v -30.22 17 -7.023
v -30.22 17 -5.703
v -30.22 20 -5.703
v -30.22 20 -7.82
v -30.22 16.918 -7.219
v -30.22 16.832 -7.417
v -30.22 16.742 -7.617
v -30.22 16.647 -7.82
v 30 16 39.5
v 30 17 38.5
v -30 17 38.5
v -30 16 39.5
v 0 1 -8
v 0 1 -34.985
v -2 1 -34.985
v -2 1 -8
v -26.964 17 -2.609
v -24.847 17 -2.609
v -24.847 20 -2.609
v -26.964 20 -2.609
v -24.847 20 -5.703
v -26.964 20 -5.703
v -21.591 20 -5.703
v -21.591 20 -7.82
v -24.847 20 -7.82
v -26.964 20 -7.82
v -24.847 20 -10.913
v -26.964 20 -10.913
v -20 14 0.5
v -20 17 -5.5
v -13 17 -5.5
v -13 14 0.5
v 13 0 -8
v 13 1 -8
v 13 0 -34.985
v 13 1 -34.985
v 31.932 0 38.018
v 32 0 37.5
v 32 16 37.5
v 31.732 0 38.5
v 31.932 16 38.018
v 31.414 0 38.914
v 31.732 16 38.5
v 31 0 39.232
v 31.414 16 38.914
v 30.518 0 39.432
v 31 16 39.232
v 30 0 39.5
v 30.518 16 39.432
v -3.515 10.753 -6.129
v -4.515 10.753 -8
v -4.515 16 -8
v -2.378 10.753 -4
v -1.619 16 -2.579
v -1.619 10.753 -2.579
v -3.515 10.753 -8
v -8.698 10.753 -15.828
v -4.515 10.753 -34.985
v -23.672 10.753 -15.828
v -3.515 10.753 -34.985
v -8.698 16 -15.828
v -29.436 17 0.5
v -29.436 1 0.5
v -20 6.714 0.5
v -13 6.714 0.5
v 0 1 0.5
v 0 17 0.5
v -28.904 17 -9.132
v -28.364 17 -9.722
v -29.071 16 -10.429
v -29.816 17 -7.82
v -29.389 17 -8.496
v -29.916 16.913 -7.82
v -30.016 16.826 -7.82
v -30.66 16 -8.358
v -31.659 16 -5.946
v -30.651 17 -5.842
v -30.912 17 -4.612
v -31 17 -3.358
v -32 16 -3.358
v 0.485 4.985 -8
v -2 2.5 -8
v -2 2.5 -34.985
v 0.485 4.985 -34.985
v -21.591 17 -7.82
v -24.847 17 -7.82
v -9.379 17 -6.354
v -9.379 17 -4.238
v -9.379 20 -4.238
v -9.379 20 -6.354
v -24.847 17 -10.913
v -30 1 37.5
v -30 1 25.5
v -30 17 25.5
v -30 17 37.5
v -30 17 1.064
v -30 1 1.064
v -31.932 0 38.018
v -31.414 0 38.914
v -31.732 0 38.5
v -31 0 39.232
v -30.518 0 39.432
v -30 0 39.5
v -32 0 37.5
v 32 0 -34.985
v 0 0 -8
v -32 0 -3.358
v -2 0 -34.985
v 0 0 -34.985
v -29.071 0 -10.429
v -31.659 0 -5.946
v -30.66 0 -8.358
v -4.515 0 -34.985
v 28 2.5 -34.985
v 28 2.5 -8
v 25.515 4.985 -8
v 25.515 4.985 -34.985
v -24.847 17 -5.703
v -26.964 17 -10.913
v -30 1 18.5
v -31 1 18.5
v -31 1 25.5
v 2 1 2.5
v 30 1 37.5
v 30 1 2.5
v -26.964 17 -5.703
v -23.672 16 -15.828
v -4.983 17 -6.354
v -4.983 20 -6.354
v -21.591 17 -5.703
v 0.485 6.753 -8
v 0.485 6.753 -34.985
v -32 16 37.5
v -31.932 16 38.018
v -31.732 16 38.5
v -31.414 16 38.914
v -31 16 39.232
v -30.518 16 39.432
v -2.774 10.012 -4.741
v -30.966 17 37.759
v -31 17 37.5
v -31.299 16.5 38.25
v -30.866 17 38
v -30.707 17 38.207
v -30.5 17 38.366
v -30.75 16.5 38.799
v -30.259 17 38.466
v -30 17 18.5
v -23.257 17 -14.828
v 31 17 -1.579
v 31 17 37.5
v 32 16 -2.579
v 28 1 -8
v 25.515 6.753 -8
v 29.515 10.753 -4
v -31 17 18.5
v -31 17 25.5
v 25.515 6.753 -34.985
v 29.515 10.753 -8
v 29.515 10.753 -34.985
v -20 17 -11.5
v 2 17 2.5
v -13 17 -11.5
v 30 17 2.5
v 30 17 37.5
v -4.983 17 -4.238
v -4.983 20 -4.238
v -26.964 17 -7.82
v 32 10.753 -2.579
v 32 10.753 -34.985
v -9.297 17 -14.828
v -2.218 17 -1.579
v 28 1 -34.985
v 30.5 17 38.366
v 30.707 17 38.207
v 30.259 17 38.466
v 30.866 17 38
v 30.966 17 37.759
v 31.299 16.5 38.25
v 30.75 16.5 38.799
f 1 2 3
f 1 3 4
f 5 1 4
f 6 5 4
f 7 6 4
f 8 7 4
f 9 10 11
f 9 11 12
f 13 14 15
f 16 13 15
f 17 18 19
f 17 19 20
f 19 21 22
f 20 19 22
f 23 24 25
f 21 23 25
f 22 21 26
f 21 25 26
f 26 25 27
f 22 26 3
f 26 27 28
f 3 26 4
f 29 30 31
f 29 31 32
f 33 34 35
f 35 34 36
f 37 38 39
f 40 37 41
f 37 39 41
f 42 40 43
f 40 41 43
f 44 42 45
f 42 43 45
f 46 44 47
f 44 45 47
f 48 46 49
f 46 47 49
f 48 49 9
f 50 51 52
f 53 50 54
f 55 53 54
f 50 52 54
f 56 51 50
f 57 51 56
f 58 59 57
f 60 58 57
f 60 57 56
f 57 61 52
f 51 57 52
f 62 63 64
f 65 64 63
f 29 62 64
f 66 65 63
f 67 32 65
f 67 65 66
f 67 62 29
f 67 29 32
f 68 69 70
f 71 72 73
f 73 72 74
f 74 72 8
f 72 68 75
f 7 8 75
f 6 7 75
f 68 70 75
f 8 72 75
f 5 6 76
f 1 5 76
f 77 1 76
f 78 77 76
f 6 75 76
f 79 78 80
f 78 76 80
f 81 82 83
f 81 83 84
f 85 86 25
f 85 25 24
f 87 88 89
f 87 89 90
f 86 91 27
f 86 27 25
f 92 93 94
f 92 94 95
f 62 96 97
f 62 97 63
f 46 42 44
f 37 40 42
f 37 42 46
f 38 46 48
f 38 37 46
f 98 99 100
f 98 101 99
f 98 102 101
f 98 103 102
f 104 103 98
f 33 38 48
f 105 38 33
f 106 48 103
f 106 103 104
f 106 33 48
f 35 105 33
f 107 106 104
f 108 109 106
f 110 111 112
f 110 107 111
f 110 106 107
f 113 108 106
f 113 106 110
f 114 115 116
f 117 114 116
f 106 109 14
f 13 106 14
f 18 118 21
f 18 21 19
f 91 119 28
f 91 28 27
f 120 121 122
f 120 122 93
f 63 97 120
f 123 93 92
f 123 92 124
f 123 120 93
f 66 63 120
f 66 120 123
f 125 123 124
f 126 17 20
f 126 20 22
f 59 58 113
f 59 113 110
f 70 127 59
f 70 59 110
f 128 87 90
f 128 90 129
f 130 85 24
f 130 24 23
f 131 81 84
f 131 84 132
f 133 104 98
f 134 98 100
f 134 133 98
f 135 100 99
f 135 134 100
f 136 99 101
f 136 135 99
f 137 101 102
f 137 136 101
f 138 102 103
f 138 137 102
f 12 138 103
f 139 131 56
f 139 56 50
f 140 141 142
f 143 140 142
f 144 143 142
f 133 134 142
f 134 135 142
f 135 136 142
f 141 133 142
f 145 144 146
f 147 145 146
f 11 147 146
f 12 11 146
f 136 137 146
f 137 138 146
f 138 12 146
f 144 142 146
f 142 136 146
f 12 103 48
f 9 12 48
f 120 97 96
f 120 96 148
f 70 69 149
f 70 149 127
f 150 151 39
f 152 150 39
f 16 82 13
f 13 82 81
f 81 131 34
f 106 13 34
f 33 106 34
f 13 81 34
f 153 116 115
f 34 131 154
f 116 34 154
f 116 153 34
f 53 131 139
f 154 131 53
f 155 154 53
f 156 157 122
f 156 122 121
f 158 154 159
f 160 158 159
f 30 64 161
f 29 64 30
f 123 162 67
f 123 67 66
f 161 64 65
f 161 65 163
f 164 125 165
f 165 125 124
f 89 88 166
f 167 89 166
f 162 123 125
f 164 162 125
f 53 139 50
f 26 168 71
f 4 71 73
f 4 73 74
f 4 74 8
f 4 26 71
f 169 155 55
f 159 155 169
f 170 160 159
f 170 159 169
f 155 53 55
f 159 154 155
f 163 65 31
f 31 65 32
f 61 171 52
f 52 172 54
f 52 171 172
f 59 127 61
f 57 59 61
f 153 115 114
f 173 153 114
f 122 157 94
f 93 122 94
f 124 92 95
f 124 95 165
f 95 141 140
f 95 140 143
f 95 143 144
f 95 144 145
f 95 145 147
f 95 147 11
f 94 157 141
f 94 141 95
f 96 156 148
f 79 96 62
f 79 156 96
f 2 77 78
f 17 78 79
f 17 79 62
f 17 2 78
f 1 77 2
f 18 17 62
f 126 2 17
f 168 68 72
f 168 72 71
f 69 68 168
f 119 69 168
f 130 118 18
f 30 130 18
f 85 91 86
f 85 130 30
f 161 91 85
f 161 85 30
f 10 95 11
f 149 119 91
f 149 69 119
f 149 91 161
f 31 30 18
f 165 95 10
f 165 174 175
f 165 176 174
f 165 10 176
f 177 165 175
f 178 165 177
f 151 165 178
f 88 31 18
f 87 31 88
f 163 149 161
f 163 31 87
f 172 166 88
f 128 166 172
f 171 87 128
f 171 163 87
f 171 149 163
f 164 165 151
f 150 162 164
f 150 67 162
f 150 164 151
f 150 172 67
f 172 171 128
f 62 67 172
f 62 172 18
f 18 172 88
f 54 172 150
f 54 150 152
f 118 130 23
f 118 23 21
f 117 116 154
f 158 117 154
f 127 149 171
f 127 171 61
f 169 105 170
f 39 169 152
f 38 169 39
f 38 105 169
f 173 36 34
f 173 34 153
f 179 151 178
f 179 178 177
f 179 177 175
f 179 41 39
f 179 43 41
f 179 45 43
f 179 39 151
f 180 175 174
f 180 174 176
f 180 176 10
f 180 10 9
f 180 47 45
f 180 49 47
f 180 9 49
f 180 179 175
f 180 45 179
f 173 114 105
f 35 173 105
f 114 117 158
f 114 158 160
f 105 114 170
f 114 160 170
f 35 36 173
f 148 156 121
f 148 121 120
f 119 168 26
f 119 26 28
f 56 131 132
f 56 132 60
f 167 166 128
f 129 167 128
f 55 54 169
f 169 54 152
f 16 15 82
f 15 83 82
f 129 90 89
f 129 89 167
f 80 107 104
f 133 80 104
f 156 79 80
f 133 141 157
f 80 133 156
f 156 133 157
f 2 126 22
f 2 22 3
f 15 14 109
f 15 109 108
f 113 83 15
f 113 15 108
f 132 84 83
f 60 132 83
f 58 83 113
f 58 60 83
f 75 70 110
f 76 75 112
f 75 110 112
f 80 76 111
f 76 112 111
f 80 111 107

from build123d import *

# Parameters (mm, degrees)
SKETCH1_W           = 60
SKETCH1_H           = 75
BOSS_EXTRUDE1_DEPTH = 1
SKETCH2_W           = 64
SKETCH2_H           = 79
SKETCH2_W_2         = 60
SKETCH2_H_2         = 75
BOSS_EXTRUDE2_DEPTH = 17
SKETCH3_W           = 60
SKETCH3_H           = 40
BOSS_EXTRUDE3_DEPTH = 16
SKETCH4_W           = 1
SKETCH4_H           = 7
CUT_EXTRUDE1_DEPTH  = 16
CUT_LOFT2_START     = -20
CUT_LOFT2_DEPTH     = 7
SKETCH7_W           = 21.435869032
SKETCH7_H           = 2
CUT_EXTRUDE2_DEPTH  = 16
CHAMFER1_SIZE       = 10
CHAMFER2_SIZE       = 2
SKETCH9_W           = 30
SKETCH9_H           = 27.5
CUT_EXTRUDE3_DEPTH  = 14
SKETCH10_W          = 2
SKETCH10_H          = 2
BOSS_EXTRUDE5_DEPTH = 7
CUT_EXTRUDE4_DEPTH  = 54.602705156
FILLET1_R           = 10
FILLET2_R           = 10
FILLET3_R           = 2
SKETCH13_W          = 4.396153847
SKETCH13_H          = 2.116666667
BOSS_EXTRUDE7_DEPTH = 3
SKETCH14_W          = 15
SKETCH14_H          = 21.25
CUT_EXTRUDE5_DEPTH  = 52.809748118
CUT_EXTRUDE6_DEPTH  = 9
SKETCH16_W          = 15
SKETCH16_H          = 17.83101705
CUT_EXTRUDE7_DEPTH  = 54.602705156
BOSS_EXTRUDE8_REACH = 62.665
SKETCH18_W          = 40.424998059
SKETCH18_H          = 8.849345581
CUT_EXTRUDE8_DEPTH  = 54.602705156
CUT_EXTRUDE9_DEPTH  = 6.246782155
CHAMFER3_SIZE       = 1
CHAMFER4_SIZE       = 4
SKETCH20_W          = 2
SKETCH20_H          = 1
BOSS_EXTRUDE9_DEPTH = 26.984954309


# Read off the part's stored shape, not the designer's step: Cut-Loft2
# Some blends are built 0.0001 mm under size
with BuildPart() as part:
    # Sketch1 → Boss-Extrude1 (new body)
    with BuildSketch(Plane(origin=(0, 0, 0), x_dir=(1, 0, 0), z_dir=(0, 1, 0))):
        Rectangle(SKETCH1_W, SKETCH1_H)
    extrude(amount=BOSS_EXTRUDE1_DEPTH)

    # Sketch2 → Boss-Extrude2 (add)
    with BuildSketch(Plane.XZ):
        Rectangle(SKETCH2_W, SKETCH2_H)
        Rectangle(SKETCH2_W_2, SKETCH2_H_2, mode=Mode.SUBTRACT)
    extrude(amount=-BOSS_EXTRUDE2_DEPTH)

    # Sketch3 → Boss-Extrude3 (add)
    with BuildSketch(Plane(origin=(0, 1, 0), x_dir=(1, 0, 0), z_dir=(0, 1, 0))):
        with Locations((0, 17.5)):
            Rectangle(SKETCH3_W, SKETCH3_H)
    extrude(amount=BOSS_EXTRUDE3_DEPTH)

    # Sketch4 → Cut-Extrude1 (cut)
    with BuildSketch(Plane(origin=(0, 17, 0), x_dir=(1, 0, 0), z_dir=(0, 1, 0))):
        with Locations((-30.5, -22)):
            Rectangle(SKETCH4_W, SKETCH4_H)
    extrude(amount=-CUT_EXTRUDE1_DEPTH, mode=Mode.SUBTRACT)

    # Cut-Loft2 outline → Cut-Loft2 (cut)
    with BuildSketch(Plane.YZ.offset(CUT_LOFT2_START)):
        Polygon((17, -5.5), (13, 2.5), (5, 2.5), (17, -11.5), align=None)
    extrude(amount=CUT_LOFT2_DEPTH, mode=Mode.SUBTRACT)

    # Sketch7 → Cut-Extrude2 (cut)
    with BuildSketch(Plane(origin=(0, 17, 0), x_dir=(1, 0, 0), z_dir=(0, 1, 0))):
        with Locations((-10.717934516, -1.5)):
            Rectangle(SKETCH7_W, SKETCH7_H)
    extrude(amount=-CUT_EXTRUDE2_DEPTH, mode=Mode.SUBTRACT)

    # Chamfer1
    # the kernel refuses this chamfer: 10 mm, written as the material it takes off along each edge
    with BuildSketch(Plane(origin=(-21.435869032, 42.71682988, 2.5), x_dir=(-0.9996219169112968, 0, 0.02749587661058636), z_dir=(0, -1, 0))) as chamfer1_piece_1_section:
        Polygon((CHAMFER1_SIZE * 0.999621916911, CHAMFER1_SIZE * 0.0274958766106), (-CHAMFER1_SIZE * 0.0274958766106, CHAMFER1_SIZE * 0.999621916911), (0, 0), align=None)
    chamfer1_piece_1 = extrude(amount=41.71682988, mode=Mode.PRIVATE)
    chamfer1_piece_1 = split(chamfer1_piece_1, bisect_by=Plane(origin=(-30, 9, 1.507613822), z_dir=(1, 0, 0)), keep=Keep.TOP, mode=Mode.PRIVATE)
    chamfer1_piece_1 = split(chamfer1_piece_1, bisect_by=Plane(origin=(-25.679544331, 9, 0.5), z_dir=(0, 0, 1)), keep=Keep.TOP, mode=Mode.PRIVATE)
    add(chamfer1_piece_1, mode=Mode.SUBTRACT)

    # Chamfer2
    chamfer2_edges = [part.edges().sort_by_distance(p)[0] for p in [
        (0, 9, 2.5),
    ]]
    chamfer(chamfer2_edges, length=CHAMFER2_SIZE - 0.0001)  # a hair under: the kernel refuses the full size

    # Sketch9 → Cut-Extrude3 (cut)
    with BuildSketch(Plane(origin=(0, 17, 0), x_dir=(1, 0, 0), z_dir=(0, 1, 0))):
        with Locations((13, 21.75)):
            Rectangle(SKETCH9_W, SKETCH9_H)
    extrude(amount=-CUT_EXTRUDE3_DEPTH, mode=Mode.SUBTRACT)

    # Sketch10 → Boss-Extrude5 (add)
    with BuildSketch(Plane(origin=(0, 3, 0), x_dir=(1, 0, 0), z_dir=(0, 1, 0))):
        Polygon((-2, 23), (10, 23), (10, 8), (28, 8), (28, 35.5), (-2, 35.5), align=None)
        with Locations((-1, 9)):
            Rectangle(SKETCH10_W, SKETCH10_H)
    extrude(amount=BOSS_EXTRUDE5_DEPTH)

    # Sketch11 → Cut-Extrude4 (cut, through all)
    with BuildSketch(Plane(origin=(0, 17, 0), x_dir=(1, 0, 0), z_dir=(0, 1, 0))):
        Polygon((0, 39.5), (-32, 7.5), (-32, 39.5), align=None)
    extrude(amount=-CUT_EXTRUDE4_DEPTH, mode=Mode.SUBTRACT)

    # Fillet1
    fillet1_edges = [part.edges().sort_by_distance(p)[0] for p in [
        (-32, 8.5, -7.5),
    ]]
    fillet(fillet1_edges, radius=FILLET1_R)

    # Fillet2
    fillet2_edges = [part.edges().sort_by_distance(p)[0] for p in [
        (0, 8.5, -39.5),
    ]]
    fillet(fillet2_edges, radius=FILLET2_R)

    # Fillet3
    fillet3_edges = [part.edges().sort_by_distance(p)[0] for p in [
        (32, 8.5, -39.5),
        (-32, 8.5, 39.5),
        (32, 8.5, 39.5),
    ]]
    fillet(fillet3_edges, radius=FILLET3_R)

    # Sketch13 → Boss-Extrude7 (add)
    with BuildSketch(Plane(origin=(0, 17, 0), x_dir=(1, 0, 0), z_dir=(0, 1, 0))):
        Polygon((-26.96363203, 7.819559599), (-26.96363203, 10.913149343), (-24.846965364, 10.913149343), (-24.846965364, 7.819559599), (-21.590555107, 7.819559599), (-21.590555107, 5.702892932), (-24.846965364, 5.702892932), (-24.846965364, 2.609303189), (-26.96363203, 2.609303189), (-26.96363203, 5.702892932), (-30.220042287, 5.702892932), (-30.220042287, 7.819559599), align=None)
        with Locations((-7.180939722, 5.29584165)):
            Rectangle(SKETCH13_W, SKETCH13_H)
    extrude(amount=BOSS_EXTRUDE7_DEPTH)

    # Sketch14 → Cut-Extrude5 (cut, through all)
    with BuildSketch(Plane(origin=(0, 10, 0), x_dir=(1, 0, 0), z_dir=(0, 1, 0))):
        with Locations((5.5, 18.625)):
            Rectangle(SKETCH14_W, SKETCH14_H)
    extrude(amount=-CUT_EXTRUDE5_DEPTH, mode=Mode.SUBTRACT)

    # Sketch15 → Cut-Extrude6 (cut)
    with BuildSketch(Plane(origin=(0, 10, 0), x_dir=(1, 0, 0), z_dir=(0, 1, 0))):
        Polygon((-2, 29.25), (13, 29.25), (13, 8), (28, 8), (28, 35.5), (-2, 35.5), align=None)
    extrude(amount=-CUT_EXTRUDE6_DEPTH, mode=Mode.SUBTRACT)

    # Sketch16 → Cut-Extrude7 (cut, through all)
    with BuildSketch(Plane(origin=(0, 17, 0), x_dir=(1, 0, 0), z_dir=(0, 1, 0))):
        with BuildLine():
            Line((-2, 37.391398481), (-2, 35.5))
            Line((-2, 35.5), (13, 35.5))
            Line((13, 35.5), (28, 35.5))
            Line((28, 35.5), (28, 39.5))
            Line((28, 39.5), (4.142135624, 39.5))
            ThreePointArc((4.142135624, 39.5), (0.89513584, 38.958170669), (-2, 37.391398481))
        make_face()
        with BuildLine():
            Line((-2, 41.583442656), (-2, 37.391398481))
            ThreePointArc((-2, 37.391398481), (0.89513584, 38.958170669), (4.142135624, 39.5))
            Line((4.142135624, 39.5), (28, 39.5))
            Line((28, 39.5), (28, 41.583442656))
            Line((28, 41.583442656), (-2, 41.583442656))
        make_face()
        with Locations((5.5, 26.584491475)):
            Rectangle(SKETCH16_W, SKETCH16_H)
    extrude(amount=-CUT_EXTRUDE7_DEPTH, mode=Mode.SUBTRACT)

    # Boss-Extrude8: up to this face of the body (flat: up to its plane)
    boss_extrude8_end = Plane(part.part.faces().sort_by_distance((29, 8.5, -39.5))[0])
    # Sketch17 → Boss-Extrude8 (add, up to the picked face)
    with BuildSketch(Plane(origin=(0, 0, -8), x_dir=(-1, 0, 0), z_dir=(0, 0, -1)), mode=Mode.PRIVATE) as boss_extrude8_sk1:
        Polygon((-28, 2.5), (-25.515371071, 4.984628929), (-25.515371071, 10.753217845), (-28, 10.753217845), align=None)
    boss_extrude8_tool1 = split(extrude(boss_extrude8_sk1.sketch, amount=BOSS_EXTRUDE8_REACH, mode=Mode.PRIVATE), bisect_by=boss_extrude8_end, keep=Keep.BOTH, mode=Mode.PRIVATE)
    # Sketch17 → Boss-Extrude8 (add, up to the picked face)
    with BuildSketch(Plane(origin=(0, 0, -8), x_dir=(-1, 0, 0), z_dir=(0, 0, -1)), mode=Mode.PRIVATE) as boss_extrude8_sk2:
        Polygon((2, 2.5), (-0.484628929, 4.984628929), (-0.484628929, 10.753217845), (2, 10.753217845), align=None)
    boss_extrude8_tool2 = split(extrude(boss_extrude8_sk2.sketch, amount=BOSS_EXTRUDE8_REACH, mode=Mode.PRIVATE), bisect_by=boss_extrude8_end, keep=Keep.BOTH, mode=Mode.PRIVATE)
    add(boss_extrude8_tool1.solids().sort_by(Axis((26.831064, 7.211077, -8), (0, 0, -1)))[0])
    add(boss_extrude8_tool2.solids().sort_by(Axis((-0.831064, 7.211077, -8), (0, 0, -1)))[0])

    # Sketch18 → Cut-Extrude8 (cut, through all)
    with BuildSketch(Plane(origin=(0, 17, 0), x_dir=(1, 0, 0), z_dir=(0, 1, 0))):
        with Locations((11.787500971, 39.409627099)):
            Rectangle(SKETCH18_W, SKETCH18_H)
    extrude(amount=-CUT_EXTRUDE8_DEPTH, mode=Mode.SUBTRACT)

    # Sketch19 → Cut-Extrude9 (cut)
    with BuildSketch(Plane(origin=(0, 17, 0), x_dir=(1, 0, 0), z_dir=(0, 1, 0))):
        Polygon((28, 34.984954309), (28, 8), (-2, 8), (-2, 34.984954309), (-4.515045691, 34.984954309), (-23.671563877, 15.828436123), (-8.697697865, 15.828436123), (-4.515045691, 8), (-1.618603226, 2.578890647), (32, 2.578890647), (32, 34.984954309), align=None)
    extrude(amount=-CUT_EXTRUDE9_DEPTH, mode=Mode.SUBTRACT)

    # Chamfer3
    # the kernel refuses this chamfer: 1 mm, written as the material it takes off along each edge
    with BuildSketch(Plane(origin=(-21.853109397, 17, -17.646890603), x_dir=(0.7068394360706796, 0.02749587661058563, 0.7068394360706675), z_dir=(-0.7071067811865415, 0, 0.7071067811865536))) as chamfer3_piece_1:
        Polygon((CHAMFER3_SIZE * 0.999621916911, -CHAMFER3_SIZE * 0.0274958766106), (-CHAMFER3_SIZE * 0.0274958766106, -CHAMFER3_SIZE * 0.999621916911), (0, 0), align=None)
    extrude(amount=10.207734683, mode=Mode.SUBTRACT)
    with BuildSketch(Plane(origin=(-22, 17, -3.357864376), x_dir=(-0.7071067811865538, 0, -0.7071067811865412), z_dir=(0.7071067811865412, 0, -0.7071067811865538))) as chamfer3_piece_2_section:
        Polygon((10 - CHAMFER3_SIZE, 0), (10, -CHAMFER3_SIZE), (10, 0), align=None)
    chamfer3_piece_2 = revolve(axis=Axis((-22, 17, -3.357864376), (0, 1, 0)), revolution_arc=45, mode=Mode.PRIVATE)
    chamfer3_piece_2 = split(chamfer3_piece_2, bisect_by=Plane(origin=(-29.540972518, 16.686713644, -7.819559599), z_dir=(0, 0, -1)), keep=Keep.TOP, mode=Mode.PRIVATE)
    chamfer3_piece_2 = split(chamfer3_piece_2, bisect_by=Plane(origin=(-30.220042287, 16.686713644, -9.324246754), z_dir=(1, 0, 0)), keep=Keep.TOP, mode=Mode.PRIVATE)
    add(chamfer3_piece_2, mode=Mode.SUBTRACT)
    with BuildSketch(Plane(origin=(-22, 17, -3.357864376), x_dir=(-0.7071067811865538, 0, -0.7071067811865412), z_dir=(0.7071067811865412, 0, -0.7071067811865538))) as chamfer3_piece_3_section:
        Polygon((10 - CHAMFER3_SIZE, 0), (10, -CHAMFER3_SIZE), (10, 0), align=None)
    chamfer3_piece_3 = revolve(axis=Axis((-22, 17, -3.357864376), (0, 1, 0)), revolution_arc=45, mode=Mode.PRIVATE)
    chamfer3_piece_3 = split(chamfer3_piece_3, bisect_by=Plane(origin=(-30.497975993, 16.585042802, -7.819559599), z_dir=(0, 0, -1)), keep=Keep.TOP, mode=Mode.PRIVATE)
    chamfer3_piece_3 = split(chamfer3_piece_3, bisect_by=Plane(origin=(-30.220042287, 16.585042802, -8.286119393), z_dir=(-1, 0, 0)), keep=Keep.TOP, mode=Mode.PRIVATE)
    add(chamfer3_piece_3, mode=Mode.SUBTRACT)
    with BuildSketch(Plane(origin=(-22, 17, -3.357864376), x_dir=(-0.7071067811865538, 0, -0.7071067811865412), z_dir=(0.7071067811865412, 0, -0.7071067811865538))) as chamfer3_piece_4_section:
        Polygon((10 - CHAMFER3_SIZE, 0), (10, -CHAMFER3_SIZE), (10, 0), align=None)
    chamfer3_piece_4 = revolve(axis=Axis((-22, 17, -3.357864376), (0, 1, 0)), revolution_arc=45, mode=Mode.PRIVATE)
    chamfer3_piece_4 = split(chamfer3_piece_4, bisect_by=Plane(origin=(-31.314504081, 16.6678644, -7.819559599), z_dir=(0, 0, 1)), keep=Keep.TOP, mode=Mode.PRIVATE)
    chamfer3_piece_4 = split(chamfer3_piece_4, bisect_by=Plane(origin=(-30.220042287, 16.6678644, -5.613397868), z_dir=(-1, 0, 0)), keep=Keep.TOP, mode=Mode.PRIVATE)
    add(chamfer3_piece_4, mode=Mode.SUBTRACT)
    with BuildSketch(Plane(origin=(30, 17, 39.5), x_dir=(0, 0.02749587661058555, -0.9996219169112968), z_dir=(-1, 0, 0))) as chamfer3_piece_5:
        Polygon((CHAMFER3_SIZE * 0.999621916911, CHAMFER3_SIZE * 0.0274958766106), (-CHAMFER3_SIZE * 0.0274958766106, CHAMFER3_SIZE * 0.999621916911), (0, 0), align=None)
    extrude(amount=60, mode=Mode.SUBTRACT)
    with BuildSketch(Plane(origin=(-32, 17, 37.5), x_dir=(0.9996219169112968, 0.027495876610585647, 0), z_dir=(0, 0, -1))) as chamfer3_piece_6:
        Polygon((CHAMFER3_SIZE * 0.999621916911, CHAMFER3_SIZE * 0.0274958766106), (-CHAMFER3_SIZE * 0.0274958766106, CHAMFER3_SIZE * 0.999621916911), (0, 0), align=None)
    extrude(amount=40.857864376, mode=Mode.SUBTRACT)
    with BuildSketch(Plane(origin=(30, 17, 37.5), x_dir=(1, 0, 0), z_dir=(0, 0, -1))) as chamfer3_piece_7:
        Polygon((2 - CHAMFER3_SIZE, 0), (2, CHAMFER3_SIZE), (2, 0), align=None)
    revolve(axis=Axis((30, 17, 37.5), (0, -1, 0)), revolution_arc=90, mode=Mode.SUBTRACT)
    with BuildSketch(Plane(origin=(-30, 17, 37.5), x_dir=(-1, 0, 0), z_dir=(0, 0, -1))) as chamfer3_piece_8:
        Polygon((2 - CHAMFER3_SIZE, 0), (2, -CHAMFER3_SIZE), (2, 0), align=None)
    revolve(axis=Axis((-30, 17, 37.5), (0, 1, 0)), revolution_arc=90, mode=Mode.SUBTRACT)
    with BuildSketch(Plane(origin=(32, 17, -5.150573635), x_dir=(-0.9996219169112968, 0.027495876610585647, 0), z_dir=(0, 0, 1))) as chamfer3_piece_9:
        Polygon((CHAMFER3_SIZE * 0.999621916911, CHAMFER3_SIZE * 0.0274958766106), (-CHAMFER3_SIZE * 0.0274958766106, CHAMFER3_SIZE * 0.999621916911), (0, 0), align=None)
    extrude(amount=42.650573635, mode=Mode.SUBTRACT)
    with BuildSketch(Plane(origin=(-26.243246865, 17, -15.828436123), x_dir=(0, 0.027495876610585647, 0.9996219169112968), z_dir=(1, 0, 0))) as chamfer3_piece_10:
        Polygon((CHAMFER3_SIZE * 0.999621916911, CHAMFER3_SIZE * 0.0274958766106), (-CHAMFER3_SIZE * 0.0274958766106, CHAMFER3_SIZE * 0.999621916911), (0, 0), align=None)
    extrude(amount=20.117231987, mode=Mode.SUBTRACT)
    with BuildSketch(Plane(origin=(-0.40671107, 17, -0.310659884), x_dir=(-0.8816690057056329, 0.02749587661058563, 0.47106659948191654), z_dir=(-0.4712447691597757, 0, -0.8820024759259748))) as chamfer3_piece_11_section:
        Polygon((CHAMFER3_SIZE * 0.999621916911, -CHAMFER3_SIZE * 0.0274958766106), (-CHAMFER3_SIZE * 0.0274958766106, -CHAMFER3_SIZE * 0.999621916911), (0, 0), align=None)
    chamfer3_piece_11 = extrude(amount=20.16548421, mode=Mode.PRIVATE)
    chamfer3_piece_11 = split(chamfer3_piece_11, bisect_by=Plane(origin=(-6.094530001, 16.669164986, -2.578890647), z_dir=(0, 0, -1)), keep=Keep.TOP, mode=Mode.PRIVATE)
    add(chamfer3_piece_11, mode=Mode.SUBTRACT)
    with BuildSketch(Plane(origin=(-4.190286214, 17, -2.578890647), x_dir=(0, 0.02749587661058563, 0.9996219169112968), z_dir=(1, 0, 0))) as chamfer3_piece_12_section:
        Polygon((CHAMFER3_SIZE * 0.999621916911, CHAMFER3_SIZE * 0.0274958766106), (-CHAMFER3_SIZE * 0.0274958766106, CHAMFER3_SIZE * 0.999621916911), (0, 0), align=None)
    chamfer3_piece_12 = extrude(amount=38.761969201, mode=Mode.PRIVATE)
    chamfer3_piece_12 = split(chamfer3_piece_12, bisect_by=Plane(origin=(2.556007493, 16.669702724, 5.234494733), z_dir=(0.8820024759259748, 0, -0.47124476915977576)), keep=Keep.TOP, mode=Mode.PRIVATE)
    add(chamfer3_piece_12, mode=Mode.SUBTRACT)
    with BuildSketch(Plane(origin=(-4.190286214, 17, -2.578890647), x_dir=(0, 0.02749587661058563, 0.9996219169112968), z_dir=(1, 0, 0))) as chamfer3_piece_13a_section:
        Polygon((CHAMFER3_SIZE * 0.999621916911, CHAMFER3_SIZE * 0.0274958766106), (-CHAMFER3_SIZE * 0.0274958766106, CHAMFER3_SIZE * 0.999621916911), (0, 0), align=None)
    chamfer3_piece_13a = extrude(amount=38.761969201, mode=Mode.PRIVATE)
    chamfer3_piece_13a = split(chamfer3_piece_13a, bisect_by=Plane(origin=(-1.74164745, 16.676807244, -2.80918564), z_dir=(-0.8820024759259748, 0, 0.47124476915977576)), keep=Keep.TOP, mode=Mode.PRIVATE)
    with BuildSketch(Plane(origin=(-0.40671107, 17, -0.310659884), x_dir=(-0.8816690057056329, 0.02749587661058563, 0.47106659948191654), z_dir=(-0.4712447691597757, 0, -0.8820024759259748))) as chamfer3_piece_13b_section:
        Polygon((CHAMFER3_SIZE * 0.999621916911, -CHAMFER3_SIZE * 0.0274958766106), (-CHAMFER3_SIZE * 0.0274958766106, -CHAMFER3_SIZE * 0.999621916911), (0, 0), align=None)
    chamfer3_piece_13b = extrude(amount=20.16548421, mode=Mode.PRIVATE)
    chamfer3_piece_13b = split(chamfer3_piece_13b, bisect_by=Plane(origin=(-1.357498525, 16.676807244, -2.578890647), z_dir=(0, 0, 1)), keep=Keep.TOP, mode=Mode.PRIVATE)
    chamfer3_piece_13 = chamfer3_piece_13a & chamfer3_piece_13b
    add(chamfer3_piece_13, mode=Mode.SUBTRACT)

    # Chamfer4
    # the kernel refuses this chamfer: 4 mm, written as the material it takes off along each edge
    with BuildSketch(Plane(origin=(0.484628929, 10.753217845, -8), x_dir=(0.02749587660983432, -0.9996219169113173, 0), z_dir=(0, 0, -1))) as chamfer4_piece_1:
        Polygon((CHAMFER4_SIZE * 0.999621916911, CHAMFER4_SIZE * 0.0274958766098), (-CHAMFER4_SIZE * 0.0274958766631, CHAMFER4_SIZE * 0.99962191691), (0, 0), align=None)
    extrude(amount=37.271686261, mode=Mode.SUBTRACT)
    with BuildSketch(Plane(origin=(25.515371071, 10.753217845, -8), x_dir=(-0.027495876609834723, -0.9996219169113173, 0), z_dir=(0, 0, -1))) as chamfer4_piece_2:
        Polygon((CHAMFER4_SIZE * 0.999621916911, -CHAMFER4_SIZE * 0.0274958766098), (-CHAMFER4_SIZE * 0.0274958766631, -CHAMFER4_SIZE * 0.99962191691), (0, 0), align=None)
    extrude(amount=37.271686261, mode=Mode.SUBTRACT)
    with BuildSketch(Plane(origin=(25.515371071, 10.753217845, -8), x_dir=(0, -0.9996219169112968, -0.027495876610586494), z_dir=(-1, 0, 0))) as chamfer4_piece_3:
        Polygon((CHAMFER4_SIZE * 0.999621916911, CHAMFER4_SIZE * 0.0274958766106), (-CHAMFER4_SIZE * 0.0274958766106, CHAMFER4_SIZE * 0.999621916911), (0, 0), align=None)
    extrude(amount=25.030742141, mode=Mode.SUBTRACT)
    with BuildSketch(Plane(origin=(25.515371071, 10.753217845, -8), x_dir=(0, -0.9996219169112968, -0.027495876610586494), z_dir=(-1, 0, 0))) as chamfer4_piece_4a_section:
        Polygon((CHAMFER4_SIZE * 0.999621916911, CHAMFER4_SIZE * 0.0274958766106), (-CHAMFER4_SIZE * 0.0274958766106, CHAMFER4_SIZE * 0.999621916911), (0, 0), align=None)
    chamfer4_piece_4a = extrude(amount=35.317474093, mode=Mode.PRIVATE)
    chamfer4_piece_4a = split(chamfer4_piece_4a, bisect_by=Plane(origin=(-3.393376338, 9.366470533, -5.900634211), z_dir=(0.8820024759259748, 0, -0.47124476915977576)), keep=Keep.TOP, mode=Mode.PRIVATE)
    chamfer4_piece_4a = split(chamfer4_piece_4a, bisect_by=Plane(origin=(0.484628929, 9.366470533, -6.807223288), z_dir=(-1, 0, 0)), keep=Keep.TOP, mode=Mode.PRIVATE)
    with BuildSketch(Plane(origin=(0.484628929, 10.753217845, 2.286731952), x_dir=(0.027495876610586358, -0.9996219169112968, 0), z_dir=(0, 0, -1))) as chamfer4_piece_4b_section:
        Polygon((CHAMFER4_SIZE * 0.999621916911, CHAMFER4_SIZE * 0.0274958766106), (-CHAMFER4_SIZE * 0.0274958766106, CHAMFER4_SIZE * 0.999621916911), (0, 0), align=None)
    chamfer4_piece_4b = extrude(amount=47.558418213, mode=Mode.PRIVATE)
    chamfer4_piece_4b = split(chamfer4_piece_4b, bisect_by=Plane(origin=(-2.589795619, 9.377652702, -4.396617127), z_dir=(0.8820024759259748, 0, -0.47124476915977576)), keep=Keep.TOP, mode=Mode.PRIVATE)
    chamfer4_piece_4b = split(chamfer4_piece_4b, bisect_by=Plane(origin=(-0.726846109, 9.377652702, -2.578890647), z_dir=(0, 0, -1)), keep=Keep.TOP, mode=Mode.PRIVATE)
    chamfer4_piece_4b = split(chamfer4_piece_4b, bisect_by=Plane(origin=(-0.726846109, 9.377652702, -8), z_dir=(0, 0, 1)), keep=Keep.TOP, mode=Mode.PRIVATE)
    chamfer4_piece_4 = chamfer4_piece_4a & chamfer4_piece_4b
    add(chamfer4_piece_4, mode=Mode.SUBTRACT)
    with BuildSketch(Plane(origin=(35.802103022, 10.753217845, -8), x_dir=(0, -0.9996219169112968, -0.027495876610586494), z_dir=(-1, 0, 0))) as chamfer4_piece_5a_section:
        Polygon((CHAMFER4_SIZE * 0.999621916911, CHAMFER4_SIZE * 0.0274958766106), (-CHAMFER4_SIZE * 0.0274958766106, CHAMFER4_SIZE * 0.999621916911), (0, 0), align=None)
    chamfer4_piece_5a = extrude(amount=35.317474093, mode=Mode.PRIVATE)
    chamfer4_piece_5a = split(chamfer4_piece_5a, bisect_by=Plane(origin=(25.515371071, 9.434043338, -6.680825493), z_dir=(1, 0, 0)), keep=Keep.TOP, mode=Mode.PRIVATE)
    with BuildSketch(Plane(origin=(25.515371071, 10.753217845, 2.286731952), x_dir=(-0.027495876610586494, -0.9996219169112968, 0), z_dir=(0, 0, -1))) as chamfer4_piece_5b_section:
        Polygon((CHAMFER4_SIZE * 0.999621916911, -CHAMFER4_SIZE * 0.0274958766106), (-CHAMFER4_SIZE * 0.0274958766106, -CHAMFER4_SIZE * 0.999621916911), (0, 0), align=None)
    chamfer4_piece_5b = extrude(amount=47.558418213, mode=Mode.PRIVATE)
    chamfer4_piece_5b = split(chamfer4_piece_5b, bisect_by=Plane(origin=(26.834545578, 9.434043338, -2.578890647), z_dir=(0, 0, -1)), keep=Keep.TOP, mode=Mode.PRIVATE)
    chamfer4_piece_5b = split(chamfer4_piece_5b, bisect_by=Plane(origin=(26.834545578, 9.434043338, -8), z_dir=(0, 0, 1)), keep=Keep.TOP, mode=Mode.PRIVATE)
    chamfer4_piece_5 = chamfer4_piece_5a & chamfer4_piece_5b
    add(chamfer4_piece_5, mode=Mode.SUBTRACT)

    # Sketch20 → Boss-Extrude9 (add)
    with BuildSketch(Plane(origin=(0, 0, -34.984954309), x_dir=(-1, 0, 0), z_dir=(0, 0, -1))):
        with Locations((1, 0.5)):
            Rectangle(SKETCH20_W, SKETCH20_H)
    extrude(amount=-BOSS_EXTRUDE9_DEPTH)


solid = part.part
